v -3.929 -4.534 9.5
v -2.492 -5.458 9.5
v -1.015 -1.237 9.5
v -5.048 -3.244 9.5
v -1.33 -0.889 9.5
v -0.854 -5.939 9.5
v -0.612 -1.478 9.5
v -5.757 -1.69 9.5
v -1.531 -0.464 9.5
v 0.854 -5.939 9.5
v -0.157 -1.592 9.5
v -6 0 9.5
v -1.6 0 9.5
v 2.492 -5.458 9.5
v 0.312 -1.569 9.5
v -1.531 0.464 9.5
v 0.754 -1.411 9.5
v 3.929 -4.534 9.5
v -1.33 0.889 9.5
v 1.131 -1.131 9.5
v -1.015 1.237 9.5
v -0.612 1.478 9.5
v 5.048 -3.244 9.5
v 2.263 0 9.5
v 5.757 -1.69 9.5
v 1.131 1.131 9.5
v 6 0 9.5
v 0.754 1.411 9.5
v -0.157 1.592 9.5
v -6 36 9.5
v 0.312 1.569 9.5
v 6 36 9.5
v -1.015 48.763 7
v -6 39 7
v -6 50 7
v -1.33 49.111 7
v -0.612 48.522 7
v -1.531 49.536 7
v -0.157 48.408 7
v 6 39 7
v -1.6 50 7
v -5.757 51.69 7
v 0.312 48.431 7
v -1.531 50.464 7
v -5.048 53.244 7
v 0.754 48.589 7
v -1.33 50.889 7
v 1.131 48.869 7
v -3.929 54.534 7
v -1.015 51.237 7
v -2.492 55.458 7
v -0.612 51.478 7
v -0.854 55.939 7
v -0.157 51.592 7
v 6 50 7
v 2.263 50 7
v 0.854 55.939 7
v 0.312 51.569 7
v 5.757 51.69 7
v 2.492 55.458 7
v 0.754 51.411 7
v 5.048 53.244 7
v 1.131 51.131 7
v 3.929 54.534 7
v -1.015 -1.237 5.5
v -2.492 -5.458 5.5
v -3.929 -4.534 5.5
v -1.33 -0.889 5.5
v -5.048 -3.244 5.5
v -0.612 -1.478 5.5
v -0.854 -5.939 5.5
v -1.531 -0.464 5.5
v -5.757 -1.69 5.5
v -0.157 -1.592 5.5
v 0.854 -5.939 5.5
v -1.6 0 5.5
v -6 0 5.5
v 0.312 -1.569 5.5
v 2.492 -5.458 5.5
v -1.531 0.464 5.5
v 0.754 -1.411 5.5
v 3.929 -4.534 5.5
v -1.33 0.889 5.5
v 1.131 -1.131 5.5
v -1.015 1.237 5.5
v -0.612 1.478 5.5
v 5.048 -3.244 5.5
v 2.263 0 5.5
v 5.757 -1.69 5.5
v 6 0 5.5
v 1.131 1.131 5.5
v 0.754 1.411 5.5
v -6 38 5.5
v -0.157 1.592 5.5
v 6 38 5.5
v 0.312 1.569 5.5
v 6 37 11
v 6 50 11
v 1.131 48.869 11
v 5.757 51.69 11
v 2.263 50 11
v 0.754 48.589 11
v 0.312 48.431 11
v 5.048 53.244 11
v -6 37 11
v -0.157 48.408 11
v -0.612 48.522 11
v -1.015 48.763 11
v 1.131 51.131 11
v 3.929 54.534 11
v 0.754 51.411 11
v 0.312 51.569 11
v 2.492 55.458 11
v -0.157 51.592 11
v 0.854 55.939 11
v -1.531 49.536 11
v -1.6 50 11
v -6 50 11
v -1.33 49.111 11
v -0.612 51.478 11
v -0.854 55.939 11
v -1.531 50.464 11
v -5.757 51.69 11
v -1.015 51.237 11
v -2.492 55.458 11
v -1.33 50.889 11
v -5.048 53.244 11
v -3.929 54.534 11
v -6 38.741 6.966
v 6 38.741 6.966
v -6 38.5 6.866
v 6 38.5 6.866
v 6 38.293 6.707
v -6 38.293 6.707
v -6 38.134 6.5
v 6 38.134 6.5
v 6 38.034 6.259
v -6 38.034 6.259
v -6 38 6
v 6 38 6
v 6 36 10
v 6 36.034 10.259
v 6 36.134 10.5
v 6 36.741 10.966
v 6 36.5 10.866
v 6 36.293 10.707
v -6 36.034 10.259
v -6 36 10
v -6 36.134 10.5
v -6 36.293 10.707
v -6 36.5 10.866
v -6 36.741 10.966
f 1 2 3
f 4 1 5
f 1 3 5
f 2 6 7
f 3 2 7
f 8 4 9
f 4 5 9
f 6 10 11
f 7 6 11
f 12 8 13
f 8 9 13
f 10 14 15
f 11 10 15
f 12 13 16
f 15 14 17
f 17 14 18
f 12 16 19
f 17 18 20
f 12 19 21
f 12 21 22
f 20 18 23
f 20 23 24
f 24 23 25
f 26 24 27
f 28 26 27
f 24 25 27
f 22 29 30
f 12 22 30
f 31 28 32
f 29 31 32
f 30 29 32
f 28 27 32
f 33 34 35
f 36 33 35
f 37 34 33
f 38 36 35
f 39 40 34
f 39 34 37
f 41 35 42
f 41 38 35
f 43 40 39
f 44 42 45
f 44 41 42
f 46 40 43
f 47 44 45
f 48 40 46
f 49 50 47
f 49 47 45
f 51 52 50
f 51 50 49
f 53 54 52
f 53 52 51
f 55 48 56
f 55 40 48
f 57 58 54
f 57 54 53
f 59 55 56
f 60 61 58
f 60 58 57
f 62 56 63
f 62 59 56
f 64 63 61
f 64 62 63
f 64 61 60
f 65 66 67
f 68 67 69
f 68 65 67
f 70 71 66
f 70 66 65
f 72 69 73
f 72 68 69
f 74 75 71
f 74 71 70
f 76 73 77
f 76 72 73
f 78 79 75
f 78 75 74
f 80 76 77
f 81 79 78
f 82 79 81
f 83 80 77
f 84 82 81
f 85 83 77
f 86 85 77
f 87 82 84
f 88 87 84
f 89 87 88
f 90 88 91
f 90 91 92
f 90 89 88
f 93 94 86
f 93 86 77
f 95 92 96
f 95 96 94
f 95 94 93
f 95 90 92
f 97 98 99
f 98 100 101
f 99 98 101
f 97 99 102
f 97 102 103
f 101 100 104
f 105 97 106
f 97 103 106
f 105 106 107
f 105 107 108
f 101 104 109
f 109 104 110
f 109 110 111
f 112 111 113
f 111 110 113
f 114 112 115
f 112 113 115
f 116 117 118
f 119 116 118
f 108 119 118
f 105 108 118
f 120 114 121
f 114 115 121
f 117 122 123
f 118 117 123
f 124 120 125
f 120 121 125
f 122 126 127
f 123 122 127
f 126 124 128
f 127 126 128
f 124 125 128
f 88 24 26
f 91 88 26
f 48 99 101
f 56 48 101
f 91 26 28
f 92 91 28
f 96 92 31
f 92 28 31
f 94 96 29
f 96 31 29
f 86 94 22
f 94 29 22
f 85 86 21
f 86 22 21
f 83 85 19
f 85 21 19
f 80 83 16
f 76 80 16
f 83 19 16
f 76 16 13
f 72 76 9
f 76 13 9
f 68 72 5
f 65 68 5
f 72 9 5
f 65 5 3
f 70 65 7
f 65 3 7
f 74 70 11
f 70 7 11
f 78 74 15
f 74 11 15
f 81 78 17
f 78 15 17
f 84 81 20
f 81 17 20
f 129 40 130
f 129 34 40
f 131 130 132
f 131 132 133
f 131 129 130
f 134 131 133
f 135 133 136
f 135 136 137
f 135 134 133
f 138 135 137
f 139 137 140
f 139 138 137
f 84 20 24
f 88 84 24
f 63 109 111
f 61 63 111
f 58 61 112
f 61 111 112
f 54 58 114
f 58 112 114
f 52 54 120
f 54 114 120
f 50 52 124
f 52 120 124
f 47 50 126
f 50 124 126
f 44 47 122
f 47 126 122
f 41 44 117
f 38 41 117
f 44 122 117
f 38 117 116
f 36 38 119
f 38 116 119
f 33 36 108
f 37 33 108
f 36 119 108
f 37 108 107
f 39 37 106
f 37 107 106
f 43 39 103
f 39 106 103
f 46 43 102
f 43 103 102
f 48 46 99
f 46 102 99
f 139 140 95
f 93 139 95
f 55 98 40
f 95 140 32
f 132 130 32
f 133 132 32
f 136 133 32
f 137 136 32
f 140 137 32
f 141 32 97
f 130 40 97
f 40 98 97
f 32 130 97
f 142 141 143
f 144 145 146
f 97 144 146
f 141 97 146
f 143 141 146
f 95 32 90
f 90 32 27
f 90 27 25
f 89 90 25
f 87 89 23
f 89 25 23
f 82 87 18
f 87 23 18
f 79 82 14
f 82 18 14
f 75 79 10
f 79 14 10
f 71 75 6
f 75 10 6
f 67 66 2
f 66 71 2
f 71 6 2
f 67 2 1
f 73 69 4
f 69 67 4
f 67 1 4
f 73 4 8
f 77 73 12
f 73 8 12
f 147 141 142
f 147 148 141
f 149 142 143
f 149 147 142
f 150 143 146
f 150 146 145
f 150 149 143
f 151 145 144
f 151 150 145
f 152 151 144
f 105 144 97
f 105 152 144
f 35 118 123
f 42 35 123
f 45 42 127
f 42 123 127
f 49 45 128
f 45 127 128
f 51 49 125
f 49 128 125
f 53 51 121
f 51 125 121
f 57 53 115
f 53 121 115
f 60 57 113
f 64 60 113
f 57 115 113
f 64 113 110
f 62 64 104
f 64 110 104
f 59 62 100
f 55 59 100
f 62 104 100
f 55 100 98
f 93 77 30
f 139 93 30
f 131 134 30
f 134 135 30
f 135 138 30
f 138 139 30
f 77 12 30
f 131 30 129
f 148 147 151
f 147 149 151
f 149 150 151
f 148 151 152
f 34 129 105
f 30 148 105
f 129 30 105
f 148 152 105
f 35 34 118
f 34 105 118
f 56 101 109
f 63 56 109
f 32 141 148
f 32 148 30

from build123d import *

# Parameters (mm, degrees)
EXTRUDE_1_DEPTH     = 11
SKETCH_2_W          = 14
SKETCH_2_H          = 18
SKETCH_2_W_2        = 11
SKETCH_2_H_2        = 41
SKETCH_2_W_3        = 1.5
SKETCH_2_H_3        = 42
CUT_EXTRUDE_1_DEPTH = 28
FILLET_1_R          = 1
SKETCH_3_W          = 132.309001911
SKETCH_3_H          = 95.019202257
CUT_EXTRUDE_2_DEPTH = 76


with BuildPart() as part:
    # 草图1 → 凸台-拉伸1 (new, symmetric)
    with BuildSketch(Plane.XY):
        with BuildLine():
            Line((6, 50), (6, 0))
            ThreePointArc((6, 0), (0, -6), (-6, 0))
            Line((-6, 0), (-6, 50))
            ThreePointArc((-6, 50), (0, 56), (6, 50))
        make_face()
        with BuildLine():
            Line((2.2627417, 50), (1.13137085, 51.13137085))
            ThreePointArc((1.13137085, 51.13137085), (-1.6, 50), (1.13137085, 48.86862915))
            Line((1.13137085, 48.86862915), (2.2627417, 50))
        make_face(mode=Mode.SUBTRACT)
        with BuildLine():
            Line((2.2627417, 0), (1.13137085, 1.13137085))
            ThreePointArc((1.13137085, 1.13137085), (-1.6, 0), (1.13137085, -1.13137085))
            Line((1.13137085, -1.13137085), (2.2627417, 0))
        make_face(mode=Mode.SUBTRACT)
    extrude(amount=EXTRUDE_1_DEPTH, both=True)

    # 草图2 → 切除-拉伸1 (cut)
    with BuildSketch(Plane(origin=(6, 0, 0), x_dir=(0, 0, -1), z_dir=(1, 0, 0))):
        with Locations((0, 47)):
            Rectangle(SKETCH_2_W, SKETCH_2_H)
        with Locations((0, 14.5)):
            Rectangle(SKETCH_2_W_2, SKETCH_2_H_2)
        with Locations((-10.25, 15)):
            Rectangle(SKETCH_2_W_3, SKETCH_2_H_3)
        with Locations((10.25, 15)):
            Rectangle(SKETCH_2_W_3, SKETCH_2_H_3)
    extrude(amount=-CUT_EXTRUDE_1_DEPTH, mode=Mode.SUBTRACT)

    # 圆角1
    fillet_1_edges = [part.edges().sort_by_distance(p)[0] for p in [
        (0, 36, -11),
        (0, 38, -7),
        (0, 38, 7),
        (0, 36, 11),
    ]]
    fillet(fillet_1_edges, radius=FILLET_1_R)

    # 草图3 → 切除-拉伸2 (cut)
    with BuildSketch(Plane(origin=(0, 0, 5.5), x_dir=(-1, 0, 0), z_dir=(0, 0, -1))):
        with Locations((2.071719377, 26.254861983)):
            Rectangle(SKETCH_3_W, SKETCH_3_H)
    extrude(amount=CUT_EXTRUDE_2_DEPTH, mode=Mode.SUBTRACT)


solid = part.part
